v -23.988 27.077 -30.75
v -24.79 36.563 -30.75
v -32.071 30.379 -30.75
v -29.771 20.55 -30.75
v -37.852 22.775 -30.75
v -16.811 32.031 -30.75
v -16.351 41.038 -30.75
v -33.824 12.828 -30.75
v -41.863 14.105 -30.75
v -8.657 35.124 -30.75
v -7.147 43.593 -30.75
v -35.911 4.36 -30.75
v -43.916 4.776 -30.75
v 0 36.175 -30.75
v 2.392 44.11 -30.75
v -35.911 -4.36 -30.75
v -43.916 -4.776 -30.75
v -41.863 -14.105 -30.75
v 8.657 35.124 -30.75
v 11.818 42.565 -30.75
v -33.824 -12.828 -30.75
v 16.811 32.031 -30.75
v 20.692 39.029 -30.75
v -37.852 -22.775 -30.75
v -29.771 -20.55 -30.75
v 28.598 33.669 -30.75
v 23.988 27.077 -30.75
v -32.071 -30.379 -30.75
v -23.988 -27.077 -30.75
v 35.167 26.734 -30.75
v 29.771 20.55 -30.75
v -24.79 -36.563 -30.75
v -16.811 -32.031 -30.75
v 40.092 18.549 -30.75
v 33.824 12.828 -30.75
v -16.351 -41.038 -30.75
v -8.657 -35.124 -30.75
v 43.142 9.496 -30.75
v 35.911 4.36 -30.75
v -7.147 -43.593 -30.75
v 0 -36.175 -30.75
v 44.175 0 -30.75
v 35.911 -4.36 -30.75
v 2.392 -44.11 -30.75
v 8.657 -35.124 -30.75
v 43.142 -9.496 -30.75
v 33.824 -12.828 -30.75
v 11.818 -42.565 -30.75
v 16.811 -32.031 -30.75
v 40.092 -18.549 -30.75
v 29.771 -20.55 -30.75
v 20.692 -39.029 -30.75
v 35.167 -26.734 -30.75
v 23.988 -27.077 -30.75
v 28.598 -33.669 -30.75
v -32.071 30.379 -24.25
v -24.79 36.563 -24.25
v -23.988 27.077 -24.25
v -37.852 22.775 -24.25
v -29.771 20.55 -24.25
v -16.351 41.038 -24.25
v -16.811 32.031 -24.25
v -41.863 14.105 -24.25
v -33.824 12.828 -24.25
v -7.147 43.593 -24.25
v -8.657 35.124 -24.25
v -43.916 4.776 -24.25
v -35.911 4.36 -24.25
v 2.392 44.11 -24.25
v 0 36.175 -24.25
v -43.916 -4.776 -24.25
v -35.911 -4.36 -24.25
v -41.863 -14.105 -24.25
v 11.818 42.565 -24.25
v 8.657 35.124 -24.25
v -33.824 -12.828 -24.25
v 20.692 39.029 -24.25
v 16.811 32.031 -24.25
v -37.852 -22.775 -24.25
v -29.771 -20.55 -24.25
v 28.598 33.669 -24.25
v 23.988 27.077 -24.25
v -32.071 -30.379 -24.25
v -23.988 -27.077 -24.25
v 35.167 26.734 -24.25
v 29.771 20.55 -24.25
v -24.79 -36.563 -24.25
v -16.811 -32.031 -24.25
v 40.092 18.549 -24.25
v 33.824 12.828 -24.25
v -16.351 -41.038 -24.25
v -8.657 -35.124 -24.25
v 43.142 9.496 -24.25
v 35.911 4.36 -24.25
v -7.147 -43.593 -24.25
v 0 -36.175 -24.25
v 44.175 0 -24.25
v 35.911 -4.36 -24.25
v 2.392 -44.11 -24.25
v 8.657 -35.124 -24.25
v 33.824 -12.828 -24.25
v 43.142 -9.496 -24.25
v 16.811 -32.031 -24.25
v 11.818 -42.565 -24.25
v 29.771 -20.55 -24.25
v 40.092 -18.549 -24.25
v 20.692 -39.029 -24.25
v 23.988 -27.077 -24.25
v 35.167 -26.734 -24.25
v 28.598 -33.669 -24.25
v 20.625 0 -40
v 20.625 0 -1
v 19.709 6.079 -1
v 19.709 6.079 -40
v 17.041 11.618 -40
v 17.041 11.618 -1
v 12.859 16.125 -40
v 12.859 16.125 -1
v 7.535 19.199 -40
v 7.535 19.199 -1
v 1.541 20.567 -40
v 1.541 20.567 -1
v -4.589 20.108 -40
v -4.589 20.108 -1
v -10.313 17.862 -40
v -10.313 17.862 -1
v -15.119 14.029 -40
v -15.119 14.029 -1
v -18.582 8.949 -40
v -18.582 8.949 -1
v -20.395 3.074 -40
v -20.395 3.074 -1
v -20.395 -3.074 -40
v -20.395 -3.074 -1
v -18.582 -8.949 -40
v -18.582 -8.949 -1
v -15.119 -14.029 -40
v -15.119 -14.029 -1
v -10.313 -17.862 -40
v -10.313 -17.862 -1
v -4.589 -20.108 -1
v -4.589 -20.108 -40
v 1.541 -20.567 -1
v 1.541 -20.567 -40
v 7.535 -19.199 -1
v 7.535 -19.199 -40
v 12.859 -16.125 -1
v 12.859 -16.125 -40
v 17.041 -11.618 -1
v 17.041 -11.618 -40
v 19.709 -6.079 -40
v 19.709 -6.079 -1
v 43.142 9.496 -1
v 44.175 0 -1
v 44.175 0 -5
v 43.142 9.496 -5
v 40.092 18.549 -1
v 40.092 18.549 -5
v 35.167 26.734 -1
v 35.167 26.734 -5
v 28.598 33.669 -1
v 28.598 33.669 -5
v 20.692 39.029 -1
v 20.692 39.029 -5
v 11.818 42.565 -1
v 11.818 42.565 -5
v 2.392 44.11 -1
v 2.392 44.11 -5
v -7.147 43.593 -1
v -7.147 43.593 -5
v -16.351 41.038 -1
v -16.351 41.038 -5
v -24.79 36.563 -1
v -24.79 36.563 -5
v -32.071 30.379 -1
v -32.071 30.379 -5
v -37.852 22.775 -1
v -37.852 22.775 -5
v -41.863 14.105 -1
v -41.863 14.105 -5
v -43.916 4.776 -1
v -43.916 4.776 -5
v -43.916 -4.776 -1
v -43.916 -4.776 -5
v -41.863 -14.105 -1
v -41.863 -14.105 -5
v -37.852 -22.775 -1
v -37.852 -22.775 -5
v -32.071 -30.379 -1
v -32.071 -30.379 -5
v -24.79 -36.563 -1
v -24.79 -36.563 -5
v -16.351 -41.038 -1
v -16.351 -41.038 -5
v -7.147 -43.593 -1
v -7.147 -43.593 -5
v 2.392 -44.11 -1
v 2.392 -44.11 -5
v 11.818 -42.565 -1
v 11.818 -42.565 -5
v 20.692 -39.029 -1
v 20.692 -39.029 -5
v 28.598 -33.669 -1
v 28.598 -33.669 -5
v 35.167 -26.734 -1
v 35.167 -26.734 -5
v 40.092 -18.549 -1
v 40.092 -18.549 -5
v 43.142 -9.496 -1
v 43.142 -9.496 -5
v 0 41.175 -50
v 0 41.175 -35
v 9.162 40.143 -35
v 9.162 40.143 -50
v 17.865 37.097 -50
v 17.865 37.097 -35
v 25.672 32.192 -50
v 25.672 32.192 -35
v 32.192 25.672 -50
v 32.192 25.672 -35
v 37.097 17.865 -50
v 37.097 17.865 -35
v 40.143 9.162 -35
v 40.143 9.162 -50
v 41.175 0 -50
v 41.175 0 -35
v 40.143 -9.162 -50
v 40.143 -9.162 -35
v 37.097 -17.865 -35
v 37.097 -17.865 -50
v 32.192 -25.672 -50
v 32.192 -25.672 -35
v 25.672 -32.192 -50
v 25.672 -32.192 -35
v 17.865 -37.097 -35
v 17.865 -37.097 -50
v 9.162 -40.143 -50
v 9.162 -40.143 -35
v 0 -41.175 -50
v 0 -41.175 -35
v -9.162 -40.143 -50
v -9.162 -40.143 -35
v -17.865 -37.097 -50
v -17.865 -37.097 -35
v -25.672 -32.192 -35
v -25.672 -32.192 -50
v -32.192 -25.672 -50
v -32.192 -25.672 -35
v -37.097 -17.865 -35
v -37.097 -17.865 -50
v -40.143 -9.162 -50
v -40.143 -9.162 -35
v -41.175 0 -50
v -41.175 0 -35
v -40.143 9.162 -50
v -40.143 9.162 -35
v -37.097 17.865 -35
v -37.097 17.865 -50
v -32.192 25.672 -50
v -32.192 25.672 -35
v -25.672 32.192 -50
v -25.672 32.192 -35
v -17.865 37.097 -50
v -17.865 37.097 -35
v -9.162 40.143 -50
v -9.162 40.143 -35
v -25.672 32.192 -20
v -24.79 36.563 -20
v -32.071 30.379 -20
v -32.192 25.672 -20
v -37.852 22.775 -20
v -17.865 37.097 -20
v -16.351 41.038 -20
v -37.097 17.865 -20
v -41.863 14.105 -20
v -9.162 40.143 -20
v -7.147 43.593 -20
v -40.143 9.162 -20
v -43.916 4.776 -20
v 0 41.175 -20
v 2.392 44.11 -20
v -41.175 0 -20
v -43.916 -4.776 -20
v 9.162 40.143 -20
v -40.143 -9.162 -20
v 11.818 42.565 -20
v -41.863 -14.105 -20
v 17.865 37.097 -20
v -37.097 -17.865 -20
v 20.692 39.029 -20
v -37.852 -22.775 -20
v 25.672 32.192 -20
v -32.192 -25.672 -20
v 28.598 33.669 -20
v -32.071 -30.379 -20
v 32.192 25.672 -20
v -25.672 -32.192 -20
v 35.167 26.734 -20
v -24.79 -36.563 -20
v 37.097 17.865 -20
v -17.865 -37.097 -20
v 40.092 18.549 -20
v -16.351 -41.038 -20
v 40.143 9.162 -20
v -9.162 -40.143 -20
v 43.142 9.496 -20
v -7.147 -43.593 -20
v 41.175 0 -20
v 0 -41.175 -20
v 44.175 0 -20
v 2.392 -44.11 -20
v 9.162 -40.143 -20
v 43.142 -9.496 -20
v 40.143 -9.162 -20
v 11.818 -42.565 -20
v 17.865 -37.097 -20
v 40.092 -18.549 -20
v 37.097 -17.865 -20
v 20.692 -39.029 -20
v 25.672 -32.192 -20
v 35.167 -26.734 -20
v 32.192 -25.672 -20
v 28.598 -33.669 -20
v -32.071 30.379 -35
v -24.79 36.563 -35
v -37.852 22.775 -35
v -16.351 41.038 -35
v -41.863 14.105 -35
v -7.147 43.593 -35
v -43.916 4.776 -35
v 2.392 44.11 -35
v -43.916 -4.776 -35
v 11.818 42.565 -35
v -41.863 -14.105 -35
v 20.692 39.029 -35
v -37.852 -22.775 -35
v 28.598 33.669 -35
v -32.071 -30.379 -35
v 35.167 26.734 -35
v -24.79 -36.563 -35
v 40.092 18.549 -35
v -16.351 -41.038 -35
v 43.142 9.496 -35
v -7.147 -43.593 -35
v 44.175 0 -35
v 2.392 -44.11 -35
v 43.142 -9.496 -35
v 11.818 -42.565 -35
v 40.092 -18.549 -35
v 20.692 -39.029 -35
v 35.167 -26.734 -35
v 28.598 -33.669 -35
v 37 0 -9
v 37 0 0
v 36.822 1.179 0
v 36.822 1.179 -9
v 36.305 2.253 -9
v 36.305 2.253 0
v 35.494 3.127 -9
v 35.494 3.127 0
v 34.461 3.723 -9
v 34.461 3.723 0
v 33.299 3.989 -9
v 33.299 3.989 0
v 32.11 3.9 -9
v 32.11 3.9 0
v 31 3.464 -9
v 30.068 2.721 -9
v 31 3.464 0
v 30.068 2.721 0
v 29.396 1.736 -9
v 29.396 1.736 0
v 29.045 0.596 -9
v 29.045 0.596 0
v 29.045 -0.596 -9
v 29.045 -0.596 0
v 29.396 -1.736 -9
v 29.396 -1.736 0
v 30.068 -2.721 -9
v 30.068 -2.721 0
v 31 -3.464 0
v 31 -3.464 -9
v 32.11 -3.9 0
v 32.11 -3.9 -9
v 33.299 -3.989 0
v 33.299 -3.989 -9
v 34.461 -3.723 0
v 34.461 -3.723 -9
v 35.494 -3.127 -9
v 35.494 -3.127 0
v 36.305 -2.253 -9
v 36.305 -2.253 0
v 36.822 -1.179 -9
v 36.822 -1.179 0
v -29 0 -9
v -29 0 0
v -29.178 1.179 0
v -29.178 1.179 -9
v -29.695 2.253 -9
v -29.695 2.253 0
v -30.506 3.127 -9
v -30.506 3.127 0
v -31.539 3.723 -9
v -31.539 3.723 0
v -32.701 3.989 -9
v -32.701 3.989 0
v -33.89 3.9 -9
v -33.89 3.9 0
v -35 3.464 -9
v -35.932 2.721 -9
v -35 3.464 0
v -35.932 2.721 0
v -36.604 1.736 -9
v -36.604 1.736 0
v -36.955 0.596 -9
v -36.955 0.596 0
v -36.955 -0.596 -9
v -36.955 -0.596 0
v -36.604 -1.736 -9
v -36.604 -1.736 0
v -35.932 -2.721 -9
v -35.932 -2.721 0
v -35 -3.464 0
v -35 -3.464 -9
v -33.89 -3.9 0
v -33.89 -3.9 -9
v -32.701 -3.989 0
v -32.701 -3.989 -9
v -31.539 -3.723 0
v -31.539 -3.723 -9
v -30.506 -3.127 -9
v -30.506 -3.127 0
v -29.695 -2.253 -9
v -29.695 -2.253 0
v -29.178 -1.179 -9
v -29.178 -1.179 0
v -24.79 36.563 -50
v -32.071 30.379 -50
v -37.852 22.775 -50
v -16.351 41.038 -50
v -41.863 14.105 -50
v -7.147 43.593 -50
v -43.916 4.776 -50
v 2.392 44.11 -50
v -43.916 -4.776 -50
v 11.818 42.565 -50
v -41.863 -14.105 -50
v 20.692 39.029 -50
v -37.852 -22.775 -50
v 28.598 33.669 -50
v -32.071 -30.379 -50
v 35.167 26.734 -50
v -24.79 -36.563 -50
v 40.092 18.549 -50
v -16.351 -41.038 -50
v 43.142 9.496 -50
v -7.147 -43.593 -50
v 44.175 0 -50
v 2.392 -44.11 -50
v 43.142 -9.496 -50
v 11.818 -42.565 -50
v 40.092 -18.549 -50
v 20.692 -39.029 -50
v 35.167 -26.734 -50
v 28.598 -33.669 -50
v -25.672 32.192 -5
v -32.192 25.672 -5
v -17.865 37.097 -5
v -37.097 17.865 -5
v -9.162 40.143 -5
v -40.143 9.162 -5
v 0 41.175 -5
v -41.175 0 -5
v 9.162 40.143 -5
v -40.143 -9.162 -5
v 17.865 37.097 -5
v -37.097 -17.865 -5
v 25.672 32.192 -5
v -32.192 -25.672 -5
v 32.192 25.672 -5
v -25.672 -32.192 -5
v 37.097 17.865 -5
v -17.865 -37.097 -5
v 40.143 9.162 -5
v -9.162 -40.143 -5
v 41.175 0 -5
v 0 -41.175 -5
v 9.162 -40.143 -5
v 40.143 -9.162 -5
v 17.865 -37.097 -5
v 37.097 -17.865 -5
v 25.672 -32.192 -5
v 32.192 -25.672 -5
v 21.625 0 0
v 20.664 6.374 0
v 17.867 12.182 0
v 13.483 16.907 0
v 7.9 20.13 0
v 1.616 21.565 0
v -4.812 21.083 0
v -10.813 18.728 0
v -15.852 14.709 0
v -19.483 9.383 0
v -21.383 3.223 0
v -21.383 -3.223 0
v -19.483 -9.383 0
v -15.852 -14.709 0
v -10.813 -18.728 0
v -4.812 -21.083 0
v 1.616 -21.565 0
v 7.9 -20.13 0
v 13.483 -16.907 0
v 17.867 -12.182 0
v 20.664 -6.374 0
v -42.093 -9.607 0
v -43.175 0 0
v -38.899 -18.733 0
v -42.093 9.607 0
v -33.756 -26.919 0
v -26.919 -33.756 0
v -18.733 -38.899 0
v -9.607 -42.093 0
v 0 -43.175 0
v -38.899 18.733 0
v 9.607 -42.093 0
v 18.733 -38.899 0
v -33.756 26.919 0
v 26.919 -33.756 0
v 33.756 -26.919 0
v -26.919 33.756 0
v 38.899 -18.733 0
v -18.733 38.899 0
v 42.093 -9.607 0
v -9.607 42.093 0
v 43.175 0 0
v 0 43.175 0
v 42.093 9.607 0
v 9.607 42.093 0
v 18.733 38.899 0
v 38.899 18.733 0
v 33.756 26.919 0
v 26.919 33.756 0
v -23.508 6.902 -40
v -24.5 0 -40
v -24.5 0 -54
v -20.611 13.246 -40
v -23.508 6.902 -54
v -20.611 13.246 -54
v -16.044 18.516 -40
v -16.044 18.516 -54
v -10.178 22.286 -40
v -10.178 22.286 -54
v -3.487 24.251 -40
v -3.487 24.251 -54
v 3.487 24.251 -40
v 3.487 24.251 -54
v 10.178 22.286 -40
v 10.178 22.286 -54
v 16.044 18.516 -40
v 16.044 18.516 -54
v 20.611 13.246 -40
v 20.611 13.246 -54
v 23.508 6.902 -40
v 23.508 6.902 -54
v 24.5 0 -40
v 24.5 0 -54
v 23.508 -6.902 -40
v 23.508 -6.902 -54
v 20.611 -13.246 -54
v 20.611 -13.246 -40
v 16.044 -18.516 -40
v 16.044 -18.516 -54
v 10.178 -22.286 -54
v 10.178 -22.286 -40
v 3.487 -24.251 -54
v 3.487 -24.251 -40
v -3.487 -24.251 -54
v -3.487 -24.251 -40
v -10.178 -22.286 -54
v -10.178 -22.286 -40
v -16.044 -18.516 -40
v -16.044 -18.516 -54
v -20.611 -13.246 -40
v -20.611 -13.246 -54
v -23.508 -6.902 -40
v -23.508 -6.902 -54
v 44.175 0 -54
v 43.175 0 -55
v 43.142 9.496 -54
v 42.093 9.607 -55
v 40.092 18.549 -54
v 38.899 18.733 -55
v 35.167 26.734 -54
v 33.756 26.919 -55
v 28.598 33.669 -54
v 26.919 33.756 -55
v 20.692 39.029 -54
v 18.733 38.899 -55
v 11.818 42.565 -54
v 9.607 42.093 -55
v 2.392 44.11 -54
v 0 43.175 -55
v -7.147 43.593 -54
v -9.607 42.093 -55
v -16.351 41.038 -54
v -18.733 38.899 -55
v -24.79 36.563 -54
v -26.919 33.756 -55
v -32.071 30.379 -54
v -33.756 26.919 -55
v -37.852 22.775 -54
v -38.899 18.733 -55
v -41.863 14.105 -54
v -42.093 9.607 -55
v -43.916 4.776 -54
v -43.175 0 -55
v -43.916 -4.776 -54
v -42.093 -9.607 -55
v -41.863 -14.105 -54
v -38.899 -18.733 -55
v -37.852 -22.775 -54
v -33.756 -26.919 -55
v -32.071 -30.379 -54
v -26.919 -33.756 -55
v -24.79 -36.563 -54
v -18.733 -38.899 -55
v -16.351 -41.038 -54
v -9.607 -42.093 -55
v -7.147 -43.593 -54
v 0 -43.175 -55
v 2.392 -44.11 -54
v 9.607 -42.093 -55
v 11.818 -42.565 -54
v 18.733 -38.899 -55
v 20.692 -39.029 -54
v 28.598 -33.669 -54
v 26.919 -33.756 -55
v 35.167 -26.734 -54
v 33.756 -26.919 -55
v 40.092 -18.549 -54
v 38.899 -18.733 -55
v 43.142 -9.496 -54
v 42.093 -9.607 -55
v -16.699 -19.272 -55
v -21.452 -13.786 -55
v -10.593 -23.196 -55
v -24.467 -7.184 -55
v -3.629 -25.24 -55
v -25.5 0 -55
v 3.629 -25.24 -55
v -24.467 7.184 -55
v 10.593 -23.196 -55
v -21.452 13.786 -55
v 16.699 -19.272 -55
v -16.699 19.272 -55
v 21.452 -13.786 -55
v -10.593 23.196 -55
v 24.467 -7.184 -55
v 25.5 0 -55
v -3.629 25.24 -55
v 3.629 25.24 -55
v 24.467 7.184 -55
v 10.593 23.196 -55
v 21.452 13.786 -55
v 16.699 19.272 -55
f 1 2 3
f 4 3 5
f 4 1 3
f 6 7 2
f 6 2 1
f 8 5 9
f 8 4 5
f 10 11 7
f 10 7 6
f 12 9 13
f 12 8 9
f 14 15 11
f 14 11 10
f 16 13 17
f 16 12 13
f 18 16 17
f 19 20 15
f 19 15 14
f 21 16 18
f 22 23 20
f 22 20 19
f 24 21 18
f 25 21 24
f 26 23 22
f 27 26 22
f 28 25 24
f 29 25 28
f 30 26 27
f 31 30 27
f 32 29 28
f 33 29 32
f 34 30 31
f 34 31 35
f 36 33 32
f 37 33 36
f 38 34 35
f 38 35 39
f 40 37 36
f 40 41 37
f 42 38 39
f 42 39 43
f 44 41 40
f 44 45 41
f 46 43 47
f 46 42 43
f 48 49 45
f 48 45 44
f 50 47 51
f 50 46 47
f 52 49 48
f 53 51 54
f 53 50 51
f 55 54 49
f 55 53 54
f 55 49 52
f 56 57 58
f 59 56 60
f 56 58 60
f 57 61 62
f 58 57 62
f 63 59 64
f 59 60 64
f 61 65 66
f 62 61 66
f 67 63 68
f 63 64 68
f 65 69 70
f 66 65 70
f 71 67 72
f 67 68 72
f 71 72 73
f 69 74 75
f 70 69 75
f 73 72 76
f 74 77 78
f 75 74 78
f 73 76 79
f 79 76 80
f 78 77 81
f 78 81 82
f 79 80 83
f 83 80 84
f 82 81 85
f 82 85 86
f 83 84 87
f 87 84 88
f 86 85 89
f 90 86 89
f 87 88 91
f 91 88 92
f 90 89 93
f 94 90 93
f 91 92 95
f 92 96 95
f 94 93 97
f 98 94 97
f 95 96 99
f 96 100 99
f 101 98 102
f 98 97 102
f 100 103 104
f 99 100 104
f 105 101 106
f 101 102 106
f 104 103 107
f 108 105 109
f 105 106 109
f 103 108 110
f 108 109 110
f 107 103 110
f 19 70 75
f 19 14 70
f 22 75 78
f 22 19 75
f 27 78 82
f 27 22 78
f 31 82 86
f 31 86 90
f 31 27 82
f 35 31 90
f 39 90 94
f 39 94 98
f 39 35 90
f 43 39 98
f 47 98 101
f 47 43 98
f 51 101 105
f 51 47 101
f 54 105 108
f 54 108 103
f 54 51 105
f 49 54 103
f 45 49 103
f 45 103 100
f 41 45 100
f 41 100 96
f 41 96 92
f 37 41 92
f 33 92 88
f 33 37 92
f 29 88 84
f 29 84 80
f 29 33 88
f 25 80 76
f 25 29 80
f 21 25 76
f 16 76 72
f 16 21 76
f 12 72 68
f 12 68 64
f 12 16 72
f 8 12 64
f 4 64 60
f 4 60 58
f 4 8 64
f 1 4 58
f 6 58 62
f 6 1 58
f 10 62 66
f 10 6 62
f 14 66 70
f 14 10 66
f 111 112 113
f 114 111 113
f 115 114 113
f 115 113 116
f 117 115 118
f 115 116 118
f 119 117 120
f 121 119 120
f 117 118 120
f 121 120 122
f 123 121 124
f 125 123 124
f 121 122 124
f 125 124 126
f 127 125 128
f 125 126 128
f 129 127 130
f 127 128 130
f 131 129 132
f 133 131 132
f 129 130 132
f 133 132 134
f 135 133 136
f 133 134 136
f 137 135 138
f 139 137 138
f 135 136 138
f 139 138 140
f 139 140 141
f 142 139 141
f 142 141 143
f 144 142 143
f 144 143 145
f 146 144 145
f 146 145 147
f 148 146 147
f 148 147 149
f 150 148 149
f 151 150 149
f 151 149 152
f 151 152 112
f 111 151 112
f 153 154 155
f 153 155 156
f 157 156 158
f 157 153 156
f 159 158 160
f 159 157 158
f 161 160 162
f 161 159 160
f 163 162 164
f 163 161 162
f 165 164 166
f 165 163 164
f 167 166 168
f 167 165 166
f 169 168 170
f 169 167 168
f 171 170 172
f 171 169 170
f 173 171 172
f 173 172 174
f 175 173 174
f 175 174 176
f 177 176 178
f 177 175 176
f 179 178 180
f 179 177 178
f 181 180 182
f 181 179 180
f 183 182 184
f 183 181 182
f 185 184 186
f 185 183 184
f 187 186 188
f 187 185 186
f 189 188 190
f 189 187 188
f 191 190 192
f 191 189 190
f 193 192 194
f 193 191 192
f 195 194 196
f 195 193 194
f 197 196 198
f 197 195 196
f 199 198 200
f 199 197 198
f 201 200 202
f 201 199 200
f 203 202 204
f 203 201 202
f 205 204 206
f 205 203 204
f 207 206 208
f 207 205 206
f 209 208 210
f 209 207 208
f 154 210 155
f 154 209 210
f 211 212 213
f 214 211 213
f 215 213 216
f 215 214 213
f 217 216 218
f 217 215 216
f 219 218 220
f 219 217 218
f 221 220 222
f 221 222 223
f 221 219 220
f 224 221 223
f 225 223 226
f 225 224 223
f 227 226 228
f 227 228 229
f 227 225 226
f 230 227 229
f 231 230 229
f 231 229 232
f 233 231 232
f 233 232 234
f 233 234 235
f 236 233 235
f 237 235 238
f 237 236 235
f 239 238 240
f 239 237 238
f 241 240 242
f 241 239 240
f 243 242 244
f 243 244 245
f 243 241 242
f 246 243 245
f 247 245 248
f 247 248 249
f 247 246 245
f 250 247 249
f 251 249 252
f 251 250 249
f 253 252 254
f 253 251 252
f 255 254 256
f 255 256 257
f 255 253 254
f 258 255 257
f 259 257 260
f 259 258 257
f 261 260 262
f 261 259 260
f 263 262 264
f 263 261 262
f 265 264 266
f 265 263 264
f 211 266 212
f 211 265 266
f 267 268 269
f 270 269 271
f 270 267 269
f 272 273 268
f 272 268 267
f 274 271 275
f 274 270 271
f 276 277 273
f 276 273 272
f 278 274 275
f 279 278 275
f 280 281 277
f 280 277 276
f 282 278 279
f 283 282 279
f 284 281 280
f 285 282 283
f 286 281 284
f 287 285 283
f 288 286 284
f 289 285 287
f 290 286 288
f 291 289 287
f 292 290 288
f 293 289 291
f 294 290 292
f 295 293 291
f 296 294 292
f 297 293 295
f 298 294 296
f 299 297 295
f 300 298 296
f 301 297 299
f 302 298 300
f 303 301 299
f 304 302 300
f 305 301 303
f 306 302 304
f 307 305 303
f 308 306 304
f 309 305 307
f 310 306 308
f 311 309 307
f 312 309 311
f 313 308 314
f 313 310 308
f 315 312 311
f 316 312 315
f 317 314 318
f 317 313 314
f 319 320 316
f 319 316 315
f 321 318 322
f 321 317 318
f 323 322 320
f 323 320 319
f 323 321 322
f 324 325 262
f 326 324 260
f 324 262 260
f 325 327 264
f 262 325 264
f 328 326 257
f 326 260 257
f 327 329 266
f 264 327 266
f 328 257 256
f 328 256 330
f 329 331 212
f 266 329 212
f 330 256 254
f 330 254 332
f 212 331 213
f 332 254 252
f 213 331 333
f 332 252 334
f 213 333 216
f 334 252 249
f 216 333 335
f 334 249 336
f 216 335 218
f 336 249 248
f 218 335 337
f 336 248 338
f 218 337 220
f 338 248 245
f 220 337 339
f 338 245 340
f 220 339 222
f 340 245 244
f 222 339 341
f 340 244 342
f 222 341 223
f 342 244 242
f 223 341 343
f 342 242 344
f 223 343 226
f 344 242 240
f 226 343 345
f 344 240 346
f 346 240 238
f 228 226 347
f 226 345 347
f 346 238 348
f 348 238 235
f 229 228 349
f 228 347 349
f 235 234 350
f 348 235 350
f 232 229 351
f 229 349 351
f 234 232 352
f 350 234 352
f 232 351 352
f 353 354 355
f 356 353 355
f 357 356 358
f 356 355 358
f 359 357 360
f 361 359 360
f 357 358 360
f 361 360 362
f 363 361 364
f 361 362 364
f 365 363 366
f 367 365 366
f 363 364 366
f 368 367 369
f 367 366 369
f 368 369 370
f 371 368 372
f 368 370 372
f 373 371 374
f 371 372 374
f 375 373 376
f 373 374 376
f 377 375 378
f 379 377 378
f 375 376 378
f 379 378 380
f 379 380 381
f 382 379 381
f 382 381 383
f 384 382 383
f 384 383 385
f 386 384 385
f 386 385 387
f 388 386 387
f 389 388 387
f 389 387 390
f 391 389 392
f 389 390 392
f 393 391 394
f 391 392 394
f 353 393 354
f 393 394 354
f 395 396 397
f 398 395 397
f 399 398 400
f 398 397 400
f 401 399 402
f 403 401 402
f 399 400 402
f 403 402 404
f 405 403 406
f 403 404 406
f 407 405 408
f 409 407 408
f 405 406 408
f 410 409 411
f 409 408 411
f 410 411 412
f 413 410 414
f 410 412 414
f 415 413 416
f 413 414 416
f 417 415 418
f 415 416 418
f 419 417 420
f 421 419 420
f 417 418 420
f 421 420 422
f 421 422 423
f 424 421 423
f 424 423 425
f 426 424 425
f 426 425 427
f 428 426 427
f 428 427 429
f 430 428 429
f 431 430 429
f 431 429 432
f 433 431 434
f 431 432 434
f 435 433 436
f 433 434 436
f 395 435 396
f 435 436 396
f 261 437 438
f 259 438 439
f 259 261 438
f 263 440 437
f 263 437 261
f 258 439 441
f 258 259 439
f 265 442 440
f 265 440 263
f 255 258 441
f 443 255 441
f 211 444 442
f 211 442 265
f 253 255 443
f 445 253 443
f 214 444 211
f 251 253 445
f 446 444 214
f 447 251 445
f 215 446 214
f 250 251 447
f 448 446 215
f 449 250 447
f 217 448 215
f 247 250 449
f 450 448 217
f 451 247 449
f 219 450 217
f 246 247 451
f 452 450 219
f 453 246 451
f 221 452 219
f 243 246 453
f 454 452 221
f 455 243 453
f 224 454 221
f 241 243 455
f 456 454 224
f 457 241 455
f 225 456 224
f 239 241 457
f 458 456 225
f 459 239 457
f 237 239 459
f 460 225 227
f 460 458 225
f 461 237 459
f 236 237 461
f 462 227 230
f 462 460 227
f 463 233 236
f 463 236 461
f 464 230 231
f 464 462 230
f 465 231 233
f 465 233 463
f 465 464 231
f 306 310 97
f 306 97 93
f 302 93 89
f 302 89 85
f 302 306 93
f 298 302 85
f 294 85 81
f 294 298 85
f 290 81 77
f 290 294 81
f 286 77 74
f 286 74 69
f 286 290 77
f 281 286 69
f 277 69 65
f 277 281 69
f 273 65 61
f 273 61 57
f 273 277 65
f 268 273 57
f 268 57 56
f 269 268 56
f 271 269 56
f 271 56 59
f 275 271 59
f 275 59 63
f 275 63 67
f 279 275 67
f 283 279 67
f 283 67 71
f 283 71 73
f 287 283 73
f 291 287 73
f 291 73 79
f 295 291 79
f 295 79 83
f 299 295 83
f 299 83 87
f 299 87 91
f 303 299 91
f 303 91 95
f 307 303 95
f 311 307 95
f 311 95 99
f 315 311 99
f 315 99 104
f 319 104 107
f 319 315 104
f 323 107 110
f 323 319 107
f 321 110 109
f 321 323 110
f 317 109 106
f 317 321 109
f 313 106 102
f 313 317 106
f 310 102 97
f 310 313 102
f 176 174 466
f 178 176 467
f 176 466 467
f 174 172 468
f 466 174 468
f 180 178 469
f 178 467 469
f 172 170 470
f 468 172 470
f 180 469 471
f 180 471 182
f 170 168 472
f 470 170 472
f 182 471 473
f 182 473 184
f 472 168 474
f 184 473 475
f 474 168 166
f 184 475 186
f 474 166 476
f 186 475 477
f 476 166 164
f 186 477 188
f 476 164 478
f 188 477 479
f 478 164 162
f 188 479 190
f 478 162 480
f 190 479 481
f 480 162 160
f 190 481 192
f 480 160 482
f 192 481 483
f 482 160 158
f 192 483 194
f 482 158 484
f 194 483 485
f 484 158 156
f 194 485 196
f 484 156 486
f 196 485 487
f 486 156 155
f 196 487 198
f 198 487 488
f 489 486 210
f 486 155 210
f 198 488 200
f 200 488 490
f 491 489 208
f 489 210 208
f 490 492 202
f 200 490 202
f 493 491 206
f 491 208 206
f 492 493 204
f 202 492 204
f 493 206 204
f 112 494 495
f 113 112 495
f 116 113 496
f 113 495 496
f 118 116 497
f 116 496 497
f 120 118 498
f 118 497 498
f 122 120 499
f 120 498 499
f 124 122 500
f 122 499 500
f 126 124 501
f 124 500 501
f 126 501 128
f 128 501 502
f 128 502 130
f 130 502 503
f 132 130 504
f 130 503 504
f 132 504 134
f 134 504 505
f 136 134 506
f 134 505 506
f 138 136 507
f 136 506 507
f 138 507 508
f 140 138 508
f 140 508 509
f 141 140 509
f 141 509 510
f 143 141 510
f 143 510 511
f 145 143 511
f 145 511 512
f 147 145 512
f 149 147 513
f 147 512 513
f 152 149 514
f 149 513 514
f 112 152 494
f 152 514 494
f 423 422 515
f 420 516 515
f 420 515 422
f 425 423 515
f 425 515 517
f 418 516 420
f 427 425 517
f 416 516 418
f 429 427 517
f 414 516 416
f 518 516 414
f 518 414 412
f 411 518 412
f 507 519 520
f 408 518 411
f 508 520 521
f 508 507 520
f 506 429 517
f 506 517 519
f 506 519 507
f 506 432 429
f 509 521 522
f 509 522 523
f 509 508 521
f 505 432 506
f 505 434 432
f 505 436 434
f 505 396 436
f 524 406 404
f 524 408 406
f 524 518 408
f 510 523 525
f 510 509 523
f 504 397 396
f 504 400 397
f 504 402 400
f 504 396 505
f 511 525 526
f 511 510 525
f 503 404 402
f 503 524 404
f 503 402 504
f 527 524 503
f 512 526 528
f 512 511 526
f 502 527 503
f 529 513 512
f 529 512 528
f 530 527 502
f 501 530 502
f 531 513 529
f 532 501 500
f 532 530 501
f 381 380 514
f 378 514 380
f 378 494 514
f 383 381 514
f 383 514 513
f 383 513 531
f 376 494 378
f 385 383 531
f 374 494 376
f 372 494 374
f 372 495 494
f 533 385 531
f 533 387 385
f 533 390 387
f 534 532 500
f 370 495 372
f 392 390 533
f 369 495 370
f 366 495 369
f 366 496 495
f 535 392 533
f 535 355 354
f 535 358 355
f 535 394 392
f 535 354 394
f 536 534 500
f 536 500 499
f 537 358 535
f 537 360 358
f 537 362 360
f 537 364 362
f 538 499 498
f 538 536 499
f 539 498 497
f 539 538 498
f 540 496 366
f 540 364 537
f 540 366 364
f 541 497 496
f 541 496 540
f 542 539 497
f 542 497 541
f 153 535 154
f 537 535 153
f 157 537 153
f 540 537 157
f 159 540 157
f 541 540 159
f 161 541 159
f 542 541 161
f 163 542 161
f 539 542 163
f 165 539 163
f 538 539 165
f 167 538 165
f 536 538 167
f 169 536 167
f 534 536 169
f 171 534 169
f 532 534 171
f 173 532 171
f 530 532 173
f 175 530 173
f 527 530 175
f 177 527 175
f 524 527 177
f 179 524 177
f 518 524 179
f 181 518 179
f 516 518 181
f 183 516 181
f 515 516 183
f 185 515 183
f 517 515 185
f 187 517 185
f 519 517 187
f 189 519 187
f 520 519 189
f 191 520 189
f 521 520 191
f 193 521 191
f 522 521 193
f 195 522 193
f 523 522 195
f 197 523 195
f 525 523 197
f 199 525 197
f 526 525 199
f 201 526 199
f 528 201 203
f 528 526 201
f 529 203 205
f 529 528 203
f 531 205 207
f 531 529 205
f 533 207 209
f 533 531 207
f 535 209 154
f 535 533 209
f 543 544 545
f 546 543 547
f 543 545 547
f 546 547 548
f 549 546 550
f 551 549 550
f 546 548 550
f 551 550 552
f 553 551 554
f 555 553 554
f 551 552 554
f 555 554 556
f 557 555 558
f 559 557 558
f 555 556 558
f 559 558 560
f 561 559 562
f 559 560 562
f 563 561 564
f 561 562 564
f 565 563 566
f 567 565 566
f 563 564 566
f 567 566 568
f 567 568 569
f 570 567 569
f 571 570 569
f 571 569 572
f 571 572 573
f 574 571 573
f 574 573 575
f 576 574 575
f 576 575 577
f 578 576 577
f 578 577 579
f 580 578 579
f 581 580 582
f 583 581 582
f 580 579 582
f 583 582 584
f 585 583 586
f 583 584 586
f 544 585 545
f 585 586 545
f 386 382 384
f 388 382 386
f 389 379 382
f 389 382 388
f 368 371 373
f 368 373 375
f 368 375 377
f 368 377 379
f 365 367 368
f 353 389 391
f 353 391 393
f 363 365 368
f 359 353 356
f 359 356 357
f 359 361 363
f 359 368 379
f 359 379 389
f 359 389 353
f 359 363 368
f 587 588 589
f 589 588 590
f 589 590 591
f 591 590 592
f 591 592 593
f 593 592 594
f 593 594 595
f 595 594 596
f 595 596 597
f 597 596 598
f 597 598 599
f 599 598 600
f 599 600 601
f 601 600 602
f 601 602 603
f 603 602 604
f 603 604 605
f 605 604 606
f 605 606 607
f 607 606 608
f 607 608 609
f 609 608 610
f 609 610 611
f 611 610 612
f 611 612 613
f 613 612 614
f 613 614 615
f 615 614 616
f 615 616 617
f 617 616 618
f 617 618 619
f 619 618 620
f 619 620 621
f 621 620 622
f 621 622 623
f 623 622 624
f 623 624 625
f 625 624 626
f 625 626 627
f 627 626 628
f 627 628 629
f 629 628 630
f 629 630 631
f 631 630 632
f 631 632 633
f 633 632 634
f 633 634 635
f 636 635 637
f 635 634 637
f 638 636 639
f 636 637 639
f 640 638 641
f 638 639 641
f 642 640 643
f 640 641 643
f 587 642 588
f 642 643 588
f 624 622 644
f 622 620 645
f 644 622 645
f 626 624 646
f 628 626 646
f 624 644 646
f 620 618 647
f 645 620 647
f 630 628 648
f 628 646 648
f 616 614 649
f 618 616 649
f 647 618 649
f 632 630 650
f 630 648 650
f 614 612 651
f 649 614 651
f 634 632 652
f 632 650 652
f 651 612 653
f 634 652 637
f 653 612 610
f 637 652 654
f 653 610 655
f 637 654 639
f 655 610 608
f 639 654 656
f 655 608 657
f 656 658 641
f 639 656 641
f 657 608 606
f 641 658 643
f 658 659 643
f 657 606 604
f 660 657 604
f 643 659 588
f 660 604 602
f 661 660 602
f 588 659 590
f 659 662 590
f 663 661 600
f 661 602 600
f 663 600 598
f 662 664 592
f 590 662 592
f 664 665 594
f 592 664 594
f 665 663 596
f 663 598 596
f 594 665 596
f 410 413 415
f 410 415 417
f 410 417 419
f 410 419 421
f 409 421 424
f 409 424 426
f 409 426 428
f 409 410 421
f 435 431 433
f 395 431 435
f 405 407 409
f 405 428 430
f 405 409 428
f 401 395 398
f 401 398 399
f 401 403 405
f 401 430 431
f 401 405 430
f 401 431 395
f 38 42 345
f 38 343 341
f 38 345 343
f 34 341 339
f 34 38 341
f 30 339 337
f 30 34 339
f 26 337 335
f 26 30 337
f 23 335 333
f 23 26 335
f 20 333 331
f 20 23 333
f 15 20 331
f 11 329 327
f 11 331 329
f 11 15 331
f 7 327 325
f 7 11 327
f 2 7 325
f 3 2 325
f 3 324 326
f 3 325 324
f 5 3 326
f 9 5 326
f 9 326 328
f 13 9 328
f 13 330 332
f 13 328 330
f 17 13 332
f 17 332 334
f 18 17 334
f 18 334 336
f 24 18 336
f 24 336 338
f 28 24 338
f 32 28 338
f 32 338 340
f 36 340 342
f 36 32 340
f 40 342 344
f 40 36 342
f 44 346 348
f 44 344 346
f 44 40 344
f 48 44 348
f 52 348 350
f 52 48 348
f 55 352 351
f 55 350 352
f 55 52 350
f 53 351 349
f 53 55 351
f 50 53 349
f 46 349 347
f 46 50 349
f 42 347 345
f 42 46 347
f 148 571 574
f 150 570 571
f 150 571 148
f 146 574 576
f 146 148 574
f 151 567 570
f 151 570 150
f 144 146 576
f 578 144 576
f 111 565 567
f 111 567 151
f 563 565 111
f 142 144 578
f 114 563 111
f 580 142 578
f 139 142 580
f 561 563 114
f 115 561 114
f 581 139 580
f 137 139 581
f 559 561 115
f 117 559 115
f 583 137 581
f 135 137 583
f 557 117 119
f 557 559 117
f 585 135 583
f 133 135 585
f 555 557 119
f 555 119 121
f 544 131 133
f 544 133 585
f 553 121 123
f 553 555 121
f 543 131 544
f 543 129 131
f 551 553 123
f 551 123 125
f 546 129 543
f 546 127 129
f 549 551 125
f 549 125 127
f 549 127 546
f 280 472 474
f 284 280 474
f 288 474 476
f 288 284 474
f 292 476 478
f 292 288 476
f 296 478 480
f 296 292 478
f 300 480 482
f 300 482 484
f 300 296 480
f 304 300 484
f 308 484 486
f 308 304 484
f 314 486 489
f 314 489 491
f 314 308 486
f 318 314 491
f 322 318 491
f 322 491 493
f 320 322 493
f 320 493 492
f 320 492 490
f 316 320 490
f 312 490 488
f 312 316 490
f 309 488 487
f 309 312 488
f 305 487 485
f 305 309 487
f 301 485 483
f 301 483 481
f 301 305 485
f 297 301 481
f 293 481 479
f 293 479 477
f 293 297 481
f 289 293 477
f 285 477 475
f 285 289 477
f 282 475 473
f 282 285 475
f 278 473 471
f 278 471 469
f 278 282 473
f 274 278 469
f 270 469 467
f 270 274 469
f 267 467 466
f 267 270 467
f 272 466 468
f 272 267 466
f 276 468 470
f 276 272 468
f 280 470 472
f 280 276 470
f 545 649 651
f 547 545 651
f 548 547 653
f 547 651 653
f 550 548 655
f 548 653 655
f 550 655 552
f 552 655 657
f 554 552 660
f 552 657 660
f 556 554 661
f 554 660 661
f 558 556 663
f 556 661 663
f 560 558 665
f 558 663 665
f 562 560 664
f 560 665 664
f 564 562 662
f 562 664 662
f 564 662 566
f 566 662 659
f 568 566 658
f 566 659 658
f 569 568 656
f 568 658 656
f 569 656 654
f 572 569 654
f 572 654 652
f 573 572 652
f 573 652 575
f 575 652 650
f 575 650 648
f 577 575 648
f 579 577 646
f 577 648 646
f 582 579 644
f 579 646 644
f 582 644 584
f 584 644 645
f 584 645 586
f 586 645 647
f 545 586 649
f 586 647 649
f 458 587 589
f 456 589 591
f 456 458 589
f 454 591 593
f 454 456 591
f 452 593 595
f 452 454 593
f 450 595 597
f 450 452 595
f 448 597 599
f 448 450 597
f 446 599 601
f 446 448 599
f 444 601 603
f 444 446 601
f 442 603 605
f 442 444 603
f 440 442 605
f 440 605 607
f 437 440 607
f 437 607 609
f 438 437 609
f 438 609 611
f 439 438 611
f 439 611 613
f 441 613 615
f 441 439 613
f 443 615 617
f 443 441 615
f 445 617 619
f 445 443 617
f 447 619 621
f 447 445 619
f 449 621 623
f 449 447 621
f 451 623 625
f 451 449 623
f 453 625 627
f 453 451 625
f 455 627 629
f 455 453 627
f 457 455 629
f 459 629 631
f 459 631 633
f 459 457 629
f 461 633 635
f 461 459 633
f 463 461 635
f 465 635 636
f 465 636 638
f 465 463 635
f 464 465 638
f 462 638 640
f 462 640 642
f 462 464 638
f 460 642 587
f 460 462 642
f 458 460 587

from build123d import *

# Parameters (mm, degrees)
SKETCH1_R           = 44.175
SKETCH1_R_2         = 20.625
BOSS_EXTRUDE1_DEPTH = 55
SKETCH2_W           = 15
SKETCH2_H           = 3
SKETCH2_W_2         = 6.5
SKETCH2_H_2         = 8
CHAMFER1_SIZE       = 1
SKETCH3_R           = 24.5
CUT_EXTRUDE1_DEPTH  = 15
CHAMFER2_SIZE       = 1
SKETCH4_R           = 4
CUT_EXTRUDE2_DEPTH  = 9


with BuildPart() as part:
    # Sketch1 → Boss-Extrude1 (new body)
    with BuildSketch(Plane.XY):
        Circle(SKETCH1_R)
        Circle(SKETCH1_R_2, mode=Mode.SUBTRACT)
    extrude(amount=-BOSS_EXTRUDE1_DEPTH)

    # Sketch2 → Cut-Revolve1 (revolve, cut)
    with BuildSketch(Plane(origin=(0, 0, 0), x_dir=(0, 0, -1), z_dir=(1, 0, 0))):
        with Locations((12.5, 42.675)):
            Rectangle(SKETCH2_W, SKETCH2_H)
        with Locations((42.5, 42.675)):
            Rectangle(SKETCH2_W, SKETCH2_H)
        with Locations((27.5, 40.175)):
            Rectangle(SKETCH2_W_2, SKETCH2_H_2)
    revolve(axis=Axis((0, 0, 0), (0, 0, -1)), mode=Mode.SUBTRACT)

    # Chamfer1
    chamfer1_edges = [part.edges().sort_by_distance(p)[0] for p in [
        (-44.175, 0, 0),
        (-44.175, 0, -55),
        (-20.625, 0, -55),
        (-20.625, 0, 0),
    ]]
    chamfer(chamfer1_edges, length=CHAMFER1_SIZE)

    # Sketch3 → Cut-Extrude1 (cut)
    with BuildSketch(Plane(origin=(0, 0, -55), x_dir=(-1, 0, 0), z_dir=(0, 0, -1))):
        Circle(SKETCH3_R)
    extrude(amount=-CUT_EXTRUDE1_DEPTH, mode=Mode.SUBTRACT)

    # Chamfer2
    chamfer2_edges = [part.edges().sort_by_distance(p)[0] for p in [
        (24.5, 0, -55),
    ]]
    chamfer(chamfer2_edges, length=CHAMFER2_SIZE)

    # Sketch4 → Cut-Extrude2 (cut)
    with BuildSketch(Plane.XY):
        with Locations((-33, 0)):
            Circle(SKETCH4_R)
        with Locations((33, 0)):
            Circle(SKETCH4_R)
    extrude(amount=-CUT_EXTRUDE2_DEPTH, mode=Mode.SUBTRACT)


solid = part.part
